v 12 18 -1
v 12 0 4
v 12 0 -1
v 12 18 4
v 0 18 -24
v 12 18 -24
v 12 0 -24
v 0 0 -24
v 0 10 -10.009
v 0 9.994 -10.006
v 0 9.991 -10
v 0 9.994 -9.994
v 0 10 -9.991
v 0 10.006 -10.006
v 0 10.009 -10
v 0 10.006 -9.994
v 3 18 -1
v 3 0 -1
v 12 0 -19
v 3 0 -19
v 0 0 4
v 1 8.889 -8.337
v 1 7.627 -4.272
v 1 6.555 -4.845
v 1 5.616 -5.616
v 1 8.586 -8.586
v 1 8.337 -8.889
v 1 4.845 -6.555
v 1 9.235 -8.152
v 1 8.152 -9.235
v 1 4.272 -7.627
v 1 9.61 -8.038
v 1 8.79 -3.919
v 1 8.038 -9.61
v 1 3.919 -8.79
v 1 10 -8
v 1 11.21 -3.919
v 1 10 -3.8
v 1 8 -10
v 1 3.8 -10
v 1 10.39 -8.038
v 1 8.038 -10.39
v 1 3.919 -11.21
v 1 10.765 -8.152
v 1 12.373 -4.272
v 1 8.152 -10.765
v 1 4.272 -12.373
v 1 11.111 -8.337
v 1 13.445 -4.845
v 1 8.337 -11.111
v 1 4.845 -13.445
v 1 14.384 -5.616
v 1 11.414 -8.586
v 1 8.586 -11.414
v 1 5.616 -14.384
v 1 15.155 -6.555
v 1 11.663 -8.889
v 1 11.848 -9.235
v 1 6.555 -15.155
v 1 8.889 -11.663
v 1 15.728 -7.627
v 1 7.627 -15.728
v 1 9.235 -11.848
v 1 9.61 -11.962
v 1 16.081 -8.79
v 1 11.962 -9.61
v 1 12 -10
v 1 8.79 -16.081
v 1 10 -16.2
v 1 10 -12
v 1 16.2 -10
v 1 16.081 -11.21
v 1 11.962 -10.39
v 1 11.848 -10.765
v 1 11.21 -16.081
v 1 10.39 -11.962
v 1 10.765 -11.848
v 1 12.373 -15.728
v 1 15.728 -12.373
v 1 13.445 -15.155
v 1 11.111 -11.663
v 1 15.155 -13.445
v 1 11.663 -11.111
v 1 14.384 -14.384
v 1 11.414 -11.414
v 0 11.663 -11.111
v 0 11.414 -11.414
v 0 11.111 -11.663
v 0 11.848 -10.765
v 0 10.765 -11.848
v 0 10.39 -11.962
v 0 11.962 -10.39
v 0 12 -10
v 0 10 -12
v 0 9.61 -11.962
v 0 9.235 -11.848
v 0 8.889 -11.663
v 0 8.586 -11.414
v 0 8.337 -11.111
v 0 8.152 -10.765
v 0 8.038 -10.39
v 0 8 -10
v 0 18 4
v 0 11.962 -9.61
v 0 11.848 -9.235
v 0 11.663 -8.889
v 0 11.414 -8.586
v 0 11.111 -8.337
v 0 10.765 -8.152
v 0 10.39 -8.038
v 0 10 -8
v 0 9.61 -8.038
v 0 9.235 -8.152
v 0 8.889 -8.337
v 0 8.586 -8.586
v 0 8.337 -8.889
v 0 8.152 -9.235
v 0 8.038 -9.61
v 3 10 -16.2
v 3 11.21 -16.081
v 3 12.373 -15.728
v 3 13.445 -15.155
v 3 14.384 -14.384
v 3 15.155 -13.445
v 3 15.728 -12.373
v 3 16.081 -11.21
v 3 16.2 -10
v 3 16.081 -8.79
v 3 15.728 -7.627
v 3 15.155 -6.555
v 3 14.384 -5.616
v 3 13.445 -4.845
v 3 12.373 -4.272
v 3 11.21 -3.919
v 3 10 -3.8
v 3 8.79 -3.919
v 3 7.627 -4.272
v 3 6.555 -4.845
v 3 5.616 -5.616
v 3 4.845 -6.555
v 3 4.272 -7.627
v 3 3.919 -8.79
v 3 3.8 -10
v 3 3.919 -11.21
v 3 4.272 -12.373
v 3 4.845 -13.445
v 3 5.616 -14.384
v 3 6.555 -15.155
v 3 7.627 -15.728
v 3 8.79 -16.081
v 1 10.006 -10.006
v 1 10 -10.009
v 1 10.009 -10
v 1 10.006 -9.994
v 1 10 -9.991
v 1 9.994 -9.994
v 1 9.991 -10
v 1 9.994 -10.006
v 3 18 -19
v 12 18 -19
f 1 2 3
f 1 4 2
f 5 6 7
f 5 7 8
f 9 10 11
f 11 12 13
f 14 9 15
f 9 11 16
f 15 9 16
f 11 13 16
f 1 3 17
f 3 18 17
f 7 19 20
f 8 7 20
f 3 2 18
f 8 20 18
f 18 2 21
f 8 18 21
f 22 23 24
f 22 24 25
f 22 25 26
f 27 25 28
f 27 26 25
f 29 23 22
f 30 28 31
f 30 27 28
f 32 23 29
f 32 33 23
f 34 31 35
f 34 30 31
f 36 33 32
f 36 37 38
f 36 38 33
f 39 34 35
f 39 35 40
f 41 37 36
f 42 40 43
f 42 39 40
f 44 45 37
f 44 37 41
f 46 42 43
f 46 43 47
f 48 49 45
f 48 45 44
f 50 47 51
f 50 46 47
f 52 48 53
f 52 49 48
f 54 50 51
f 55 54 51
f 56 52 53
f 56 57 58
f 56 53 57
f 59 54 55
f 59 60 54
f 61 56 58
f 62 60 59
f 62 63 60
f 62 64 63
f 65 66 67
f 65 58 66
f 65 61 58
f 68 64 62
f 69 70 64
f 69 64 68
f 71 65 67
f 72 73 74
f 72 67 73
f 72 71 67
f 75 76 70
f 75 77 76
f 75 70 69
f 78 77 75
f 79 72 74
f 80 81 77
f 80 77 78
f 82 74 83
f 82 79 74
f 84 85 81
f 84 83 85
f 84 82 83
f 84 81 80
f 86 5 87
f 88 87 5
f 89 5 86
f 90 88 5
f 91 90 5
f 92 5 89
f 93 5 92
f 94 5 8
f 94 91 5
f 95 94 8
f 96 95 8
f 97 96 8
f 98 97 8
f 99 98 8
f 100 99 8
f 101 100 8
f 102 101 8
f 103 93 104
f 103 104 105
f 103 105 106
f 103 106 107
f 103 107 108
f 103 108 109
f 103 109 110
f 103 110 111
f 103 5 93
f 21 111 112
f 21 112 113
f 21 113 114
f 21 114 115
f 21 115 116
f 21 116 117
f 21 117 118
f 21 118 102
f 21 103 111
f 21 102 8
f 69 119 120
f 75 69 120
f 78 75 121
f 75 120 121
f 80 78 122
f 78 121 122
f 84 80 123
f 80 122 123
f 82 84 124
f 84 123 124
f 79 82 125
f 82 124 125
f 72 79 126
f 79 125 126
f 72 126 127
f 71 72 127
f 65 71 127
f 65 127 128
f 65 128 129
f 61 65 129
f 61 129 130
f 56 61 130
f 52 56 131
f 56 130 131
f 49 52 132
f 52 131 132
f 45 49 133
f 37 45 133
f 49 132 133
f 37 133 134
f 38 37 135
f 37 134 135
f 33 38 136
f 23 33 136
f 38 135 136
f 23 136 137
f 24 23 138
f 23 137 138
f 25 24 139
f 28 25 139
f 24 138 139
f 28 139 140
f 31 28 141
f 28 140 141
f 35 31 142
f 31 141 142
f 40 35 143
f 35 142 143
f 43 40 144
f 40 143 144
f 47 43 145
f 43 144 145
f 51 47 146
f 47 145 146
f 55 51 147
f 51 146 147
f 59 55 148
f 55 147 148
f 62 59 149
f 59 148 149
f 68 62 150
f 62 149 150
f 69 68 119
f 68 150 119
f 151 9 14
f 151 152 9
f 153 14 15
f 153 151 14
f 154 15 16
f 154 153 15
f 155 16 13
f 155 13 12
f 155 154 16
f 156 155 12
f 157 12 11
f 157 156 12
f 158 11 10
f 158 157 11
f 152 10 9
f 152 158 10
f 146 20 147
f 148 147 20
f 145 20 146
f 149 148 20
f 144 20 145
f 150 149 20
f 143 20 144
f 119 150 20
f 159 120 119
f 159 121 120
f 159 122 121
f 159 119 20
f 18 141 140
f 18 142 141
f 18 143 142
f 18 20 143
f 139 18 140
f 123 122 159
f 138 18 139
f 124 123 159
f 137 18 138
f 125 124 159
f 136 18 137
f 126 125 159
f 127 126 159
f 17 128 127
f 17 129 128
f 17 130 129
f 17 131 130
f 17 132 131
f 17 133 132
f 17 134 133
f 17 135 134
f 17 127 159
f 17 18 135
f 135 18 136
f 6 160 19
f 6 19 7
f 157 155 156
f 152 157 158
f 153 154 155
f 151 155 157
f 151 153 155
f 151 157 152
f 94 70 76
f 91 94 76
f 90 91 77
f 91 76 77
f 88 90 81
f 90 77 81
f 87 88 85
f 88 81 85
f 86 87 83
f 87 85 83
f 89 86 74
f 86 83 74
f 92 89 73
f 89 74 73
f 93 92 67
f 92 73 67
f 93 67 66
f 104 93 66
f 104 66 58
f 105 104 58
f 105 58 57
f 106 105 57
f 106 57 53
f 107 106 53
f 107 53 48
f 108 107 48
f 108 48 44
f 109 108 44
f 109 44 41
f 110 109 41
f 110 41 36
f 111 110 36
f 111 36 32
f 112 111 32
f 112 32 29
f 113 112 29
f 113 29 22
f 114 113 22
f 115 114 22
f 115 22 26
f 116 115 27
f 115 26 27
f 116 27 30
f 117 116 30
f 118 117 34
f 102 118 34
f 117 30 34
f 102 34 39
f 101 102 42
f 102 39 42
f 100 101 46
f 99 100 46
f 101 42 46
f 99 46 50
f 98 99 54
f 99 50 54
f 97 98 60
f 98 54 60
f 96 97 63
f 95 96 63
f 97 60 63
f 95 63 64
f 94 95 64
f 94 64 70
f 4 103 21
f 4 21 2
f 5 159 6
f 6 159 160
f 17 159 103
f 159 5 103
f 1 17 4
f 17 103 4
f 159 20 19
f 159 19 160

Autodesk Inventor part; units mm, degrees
ref_plane "YZ Plane" through (0, 0, 0) normal (1, 0, 0) x (0, 1, 0)
ref_plane "XZ Plane" through (0, 0, 0) normal (0, 1, 0) x (-1, 0, 0)
ref_plane "XY Plane" through (0, 0, 0) normal (0, 0, 1) x (1, 0, 0)
sketch "Sketch1" plane through (0, 0, 0) normal (1, 0, 0) x (0, 1, 0)
  line L0 (0, 0) -> (18, 0)
  line L1 (18, 0) -> (18, -20)
  line L2 (18, -20) -> (0, -20)
  line L3 (0, -20) -> (0, 0)
  dimension "d0" = 18
  dimension "d1" = 20
extrude "Extrusion1" add sketch "Sketch1" along normal blind 3
sketch "Sketch2" plane through (3, 0, 0) normal (1, 0, 0) x (0, 0, -1)
  line L0 (0, 0) -> (20, 0) projected
  line L1 (20, 18) -> (0, 18) projected
  line L2 (0, 0) -> (1, 0)
  line L3 (1, 0) -> (1, 18)
  line L4 (1, 18) -> (0, 18)
  line L5 (0, 18) -> (0, 0)
  line L6 (20, 0) -> (20, 18) projected
  line L7 (20, 0) -> (19, 0)
  line L8 (19, 0) -> (19, 18)
  line L9 (19, 18) -> (20, 18)
  line L10 (20, 18) -> (20, 0)
  dimension "d4" = 1
  dimension "d5" = 1
extrude "Extrusion2" add sketch "Sketch2" along normal blind 5 contours L5 L1 L3 L0 | L8 L1 L6 L0
sketch "Sketch3" plane through (3, 0, 0) normal (1, 0, 0) x (0, 0, -1)
  circle A0 centre (10, 10) radius 0.009
  circle A1 centre (10, 10) radius 2
  point P0 (0, 0)
  dimension "d8" = 4
extrude "Extrusion3" cut sketch "Sketch3" against normal blind 5
sketch "Sketch4" plane through (0, 0, 0) normal (0, 0, 1) x (1, 0, 0)
  line L0 (0, 0) -> (8, 0)
  line L1 (8, 0) -> (8, 18)
  line L2 (8, 18) -> (0, 18)
  line L3 (0, 18) -> (0, 0)
extrude "Extrusion4" add sketch "Sketch4" along normal blind 4
sketch "Sketch5" plane through (0, 0, -20) normal (0, 0, -1) x (-1, 0, 0)
  line L0 (0, 18) -> (0, 0) projected
  line L1 (-8, 0) -> (-8, 18) projected
  line L2 (0, 18) -> (-8, 18)
  line L3 (-8, 18) -> (-8, 0)
  line L4 (-8, 0) -> (0, 0)
  line L5 (0, 0) -> (0, 18)
extrude "Extrusion5" add sketch "Sketch5" along normal blind 4
sketch "Sketch6" plane through (8, 0, 0) normal (1, 0, 0) x (0, 0, -1)
  line L0 (19, 0) -> (24, 0) projected
  line L1 (24, 0) -> (19, 0)
  line L2 (19, 0) -> (19, 18)
  line L3 (19, 18) -> (24, 18)
  line L4 (24, 18) -> (24, 0)
  line L5 (1, 0) -> (-4, 0) projected
  line L6 (1, 0) -> (1, 18) projected
  line L7 (-4, 0) -> (1, 0)
  line L8 (1, 0) -> (1, 18)
  line L9 (1, 18) -> (-4, 18)
  line L10 (-4, 18) -> (-4, 0)
  point P0 (0, 0)
extrude "Extrusion6" add sketch "Sketch6" along normal blind 4
sketch "Sketch7" plane through (3, 0, 0) normal (1, 0, 0) x (0, 0, -1)
  circle A0 centre (10, 10) radius 0.009 projected
  circle A1 centre (10, 10) radius 6
  point P0 (0, 0)
  dimension "d17" = 12
extrude "Extrusion7" cut sketch "Sketch7" against normal blind 2
sketch "Sketch8" plane through (3, 0, 0) normal (1, 0, 0) x (0, 0, -1)
  circle A0 centre (10, 10) radius 0.009 projected
  circle A1 centre (10, 10) radius 6.2
  point P0 (0, 0)
  dimension "d20" = 12.4
extrude "Extrusion8" cut sketch "Sketch8" against normal blind 2 contours A0 | A1
properties part number "holdervegg"
